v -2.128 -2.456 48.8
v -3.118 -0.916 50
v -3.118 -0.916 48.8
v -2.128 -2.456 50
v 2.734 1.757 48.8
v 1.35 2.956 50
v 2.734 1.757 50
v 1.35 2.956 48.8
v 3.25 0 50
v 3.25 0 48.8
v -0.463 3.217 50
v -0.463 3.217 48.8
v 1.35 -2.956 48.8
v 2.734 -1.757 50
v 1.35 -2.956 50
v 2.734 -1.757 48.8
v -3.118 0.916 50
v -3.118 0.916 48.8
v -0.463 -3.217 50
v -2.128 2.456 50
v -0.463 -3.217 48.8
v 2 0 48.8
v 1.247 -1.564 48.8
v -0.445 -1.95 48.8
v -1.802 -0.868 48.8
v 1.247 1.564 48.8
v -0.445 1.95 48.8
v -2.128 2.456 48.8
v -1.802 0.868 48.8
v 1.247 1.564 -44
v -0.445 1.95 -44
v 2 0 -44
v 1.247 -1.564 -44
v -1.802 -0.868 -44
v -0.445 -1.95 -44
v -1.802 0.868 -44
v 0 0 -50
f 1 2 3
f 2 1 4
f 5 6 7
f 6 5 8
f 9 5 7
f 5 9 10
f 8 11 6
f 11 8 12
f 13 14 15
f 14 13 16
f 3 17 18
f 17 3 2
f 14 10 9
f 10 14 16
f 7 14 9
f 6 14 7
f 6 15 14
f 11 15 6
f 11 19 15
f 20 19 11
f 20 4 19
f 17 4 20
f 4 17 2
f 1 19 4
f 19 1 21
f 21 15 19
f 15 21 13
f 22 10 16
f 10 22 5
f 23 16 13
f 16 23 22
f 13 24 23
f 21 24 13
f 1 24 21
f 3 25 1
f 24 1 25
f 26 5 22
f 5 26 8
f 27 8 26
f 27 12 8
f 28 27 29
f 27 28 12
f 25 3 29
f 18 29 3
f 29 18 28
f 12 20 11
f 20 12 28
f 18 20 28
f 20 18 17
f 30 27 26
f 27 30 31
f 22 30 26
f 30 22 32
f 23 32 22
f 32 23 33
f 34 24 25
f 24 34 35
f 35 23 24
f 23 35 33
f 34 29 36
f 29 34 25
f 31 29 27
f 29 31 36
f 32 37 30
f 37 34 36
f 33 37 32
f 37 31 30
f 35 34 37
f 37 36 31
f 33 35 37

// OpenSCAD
//
//  File:        nagel.scad
//
//  License:     Creative Commons Attribution 4.0 International (CC BY 4.0)
//               https://creativecommons.org/licenses/by/4.0/
//
//  You are free to:
//    - Share: copy and redistribute the material in any medium or format
//    - Adapt: remix, transform, and build upon the material for any purpose
//
//  Under the following terms:
//    - Attribution: You must give appropriate credit, provide a link to the license,
//      and indicate if changes were made. You may do so in any reasonable manner,
//      but not in any way that suggests the licensor endorses you or your use.
//
//  (c) 2025 Sebastian Toepfer – https://github.com/sebastian-toepfer/3d-models
//
//  SPDX-License-Identifier: CC-BY-4.0
nagel();

module nagel(
    durchmesser = 4.0,
    laenge = 100,
    kopf_durchmesser = 6.5,
    kopf_hoehe = 1.2,
    spitzenhoehe = 6.0,
    farbe = "silver"
) {
    color(farbe) {
        union() {
            translate([0, 0, (laenge - kopf_hoehe) / 2]) {
                nagelkopf(hoehe = kopf_hoehe, durchmesser = kopf_durchmesser);
            }
            translate([0, 0, (spitzenhoehe - kopf_hoehe) / 2]) {
                nagelkoerper(laenge = laenge - kopf_hoehe - spitzenhoehe, durchmesser = durchmesser);
            }
            translate([0, 0, (laenge - spitzenhoehe) / -2]) {
                nagelspitze(laenge = spitzenhoehe, durchmesser = durchmesser);
            }
        }
    }
    
    module nagelkopf(hoehe = 1, durchmesser = 6) {
        cylinder(h = hoehe, d = durchmesser, center = true);
    }
    
    module nagelkoerper(laenge = 98, durchmesser = 4) {
        cylinder(h = laenge, d = durchmesser, center = true);
    }
    
    module nagelspitze(laenge = 5, durchmesser = 4) {
        cylinder(h = laenge, d1 = 0, d2 = durchmesser, center = true);
    }
}
